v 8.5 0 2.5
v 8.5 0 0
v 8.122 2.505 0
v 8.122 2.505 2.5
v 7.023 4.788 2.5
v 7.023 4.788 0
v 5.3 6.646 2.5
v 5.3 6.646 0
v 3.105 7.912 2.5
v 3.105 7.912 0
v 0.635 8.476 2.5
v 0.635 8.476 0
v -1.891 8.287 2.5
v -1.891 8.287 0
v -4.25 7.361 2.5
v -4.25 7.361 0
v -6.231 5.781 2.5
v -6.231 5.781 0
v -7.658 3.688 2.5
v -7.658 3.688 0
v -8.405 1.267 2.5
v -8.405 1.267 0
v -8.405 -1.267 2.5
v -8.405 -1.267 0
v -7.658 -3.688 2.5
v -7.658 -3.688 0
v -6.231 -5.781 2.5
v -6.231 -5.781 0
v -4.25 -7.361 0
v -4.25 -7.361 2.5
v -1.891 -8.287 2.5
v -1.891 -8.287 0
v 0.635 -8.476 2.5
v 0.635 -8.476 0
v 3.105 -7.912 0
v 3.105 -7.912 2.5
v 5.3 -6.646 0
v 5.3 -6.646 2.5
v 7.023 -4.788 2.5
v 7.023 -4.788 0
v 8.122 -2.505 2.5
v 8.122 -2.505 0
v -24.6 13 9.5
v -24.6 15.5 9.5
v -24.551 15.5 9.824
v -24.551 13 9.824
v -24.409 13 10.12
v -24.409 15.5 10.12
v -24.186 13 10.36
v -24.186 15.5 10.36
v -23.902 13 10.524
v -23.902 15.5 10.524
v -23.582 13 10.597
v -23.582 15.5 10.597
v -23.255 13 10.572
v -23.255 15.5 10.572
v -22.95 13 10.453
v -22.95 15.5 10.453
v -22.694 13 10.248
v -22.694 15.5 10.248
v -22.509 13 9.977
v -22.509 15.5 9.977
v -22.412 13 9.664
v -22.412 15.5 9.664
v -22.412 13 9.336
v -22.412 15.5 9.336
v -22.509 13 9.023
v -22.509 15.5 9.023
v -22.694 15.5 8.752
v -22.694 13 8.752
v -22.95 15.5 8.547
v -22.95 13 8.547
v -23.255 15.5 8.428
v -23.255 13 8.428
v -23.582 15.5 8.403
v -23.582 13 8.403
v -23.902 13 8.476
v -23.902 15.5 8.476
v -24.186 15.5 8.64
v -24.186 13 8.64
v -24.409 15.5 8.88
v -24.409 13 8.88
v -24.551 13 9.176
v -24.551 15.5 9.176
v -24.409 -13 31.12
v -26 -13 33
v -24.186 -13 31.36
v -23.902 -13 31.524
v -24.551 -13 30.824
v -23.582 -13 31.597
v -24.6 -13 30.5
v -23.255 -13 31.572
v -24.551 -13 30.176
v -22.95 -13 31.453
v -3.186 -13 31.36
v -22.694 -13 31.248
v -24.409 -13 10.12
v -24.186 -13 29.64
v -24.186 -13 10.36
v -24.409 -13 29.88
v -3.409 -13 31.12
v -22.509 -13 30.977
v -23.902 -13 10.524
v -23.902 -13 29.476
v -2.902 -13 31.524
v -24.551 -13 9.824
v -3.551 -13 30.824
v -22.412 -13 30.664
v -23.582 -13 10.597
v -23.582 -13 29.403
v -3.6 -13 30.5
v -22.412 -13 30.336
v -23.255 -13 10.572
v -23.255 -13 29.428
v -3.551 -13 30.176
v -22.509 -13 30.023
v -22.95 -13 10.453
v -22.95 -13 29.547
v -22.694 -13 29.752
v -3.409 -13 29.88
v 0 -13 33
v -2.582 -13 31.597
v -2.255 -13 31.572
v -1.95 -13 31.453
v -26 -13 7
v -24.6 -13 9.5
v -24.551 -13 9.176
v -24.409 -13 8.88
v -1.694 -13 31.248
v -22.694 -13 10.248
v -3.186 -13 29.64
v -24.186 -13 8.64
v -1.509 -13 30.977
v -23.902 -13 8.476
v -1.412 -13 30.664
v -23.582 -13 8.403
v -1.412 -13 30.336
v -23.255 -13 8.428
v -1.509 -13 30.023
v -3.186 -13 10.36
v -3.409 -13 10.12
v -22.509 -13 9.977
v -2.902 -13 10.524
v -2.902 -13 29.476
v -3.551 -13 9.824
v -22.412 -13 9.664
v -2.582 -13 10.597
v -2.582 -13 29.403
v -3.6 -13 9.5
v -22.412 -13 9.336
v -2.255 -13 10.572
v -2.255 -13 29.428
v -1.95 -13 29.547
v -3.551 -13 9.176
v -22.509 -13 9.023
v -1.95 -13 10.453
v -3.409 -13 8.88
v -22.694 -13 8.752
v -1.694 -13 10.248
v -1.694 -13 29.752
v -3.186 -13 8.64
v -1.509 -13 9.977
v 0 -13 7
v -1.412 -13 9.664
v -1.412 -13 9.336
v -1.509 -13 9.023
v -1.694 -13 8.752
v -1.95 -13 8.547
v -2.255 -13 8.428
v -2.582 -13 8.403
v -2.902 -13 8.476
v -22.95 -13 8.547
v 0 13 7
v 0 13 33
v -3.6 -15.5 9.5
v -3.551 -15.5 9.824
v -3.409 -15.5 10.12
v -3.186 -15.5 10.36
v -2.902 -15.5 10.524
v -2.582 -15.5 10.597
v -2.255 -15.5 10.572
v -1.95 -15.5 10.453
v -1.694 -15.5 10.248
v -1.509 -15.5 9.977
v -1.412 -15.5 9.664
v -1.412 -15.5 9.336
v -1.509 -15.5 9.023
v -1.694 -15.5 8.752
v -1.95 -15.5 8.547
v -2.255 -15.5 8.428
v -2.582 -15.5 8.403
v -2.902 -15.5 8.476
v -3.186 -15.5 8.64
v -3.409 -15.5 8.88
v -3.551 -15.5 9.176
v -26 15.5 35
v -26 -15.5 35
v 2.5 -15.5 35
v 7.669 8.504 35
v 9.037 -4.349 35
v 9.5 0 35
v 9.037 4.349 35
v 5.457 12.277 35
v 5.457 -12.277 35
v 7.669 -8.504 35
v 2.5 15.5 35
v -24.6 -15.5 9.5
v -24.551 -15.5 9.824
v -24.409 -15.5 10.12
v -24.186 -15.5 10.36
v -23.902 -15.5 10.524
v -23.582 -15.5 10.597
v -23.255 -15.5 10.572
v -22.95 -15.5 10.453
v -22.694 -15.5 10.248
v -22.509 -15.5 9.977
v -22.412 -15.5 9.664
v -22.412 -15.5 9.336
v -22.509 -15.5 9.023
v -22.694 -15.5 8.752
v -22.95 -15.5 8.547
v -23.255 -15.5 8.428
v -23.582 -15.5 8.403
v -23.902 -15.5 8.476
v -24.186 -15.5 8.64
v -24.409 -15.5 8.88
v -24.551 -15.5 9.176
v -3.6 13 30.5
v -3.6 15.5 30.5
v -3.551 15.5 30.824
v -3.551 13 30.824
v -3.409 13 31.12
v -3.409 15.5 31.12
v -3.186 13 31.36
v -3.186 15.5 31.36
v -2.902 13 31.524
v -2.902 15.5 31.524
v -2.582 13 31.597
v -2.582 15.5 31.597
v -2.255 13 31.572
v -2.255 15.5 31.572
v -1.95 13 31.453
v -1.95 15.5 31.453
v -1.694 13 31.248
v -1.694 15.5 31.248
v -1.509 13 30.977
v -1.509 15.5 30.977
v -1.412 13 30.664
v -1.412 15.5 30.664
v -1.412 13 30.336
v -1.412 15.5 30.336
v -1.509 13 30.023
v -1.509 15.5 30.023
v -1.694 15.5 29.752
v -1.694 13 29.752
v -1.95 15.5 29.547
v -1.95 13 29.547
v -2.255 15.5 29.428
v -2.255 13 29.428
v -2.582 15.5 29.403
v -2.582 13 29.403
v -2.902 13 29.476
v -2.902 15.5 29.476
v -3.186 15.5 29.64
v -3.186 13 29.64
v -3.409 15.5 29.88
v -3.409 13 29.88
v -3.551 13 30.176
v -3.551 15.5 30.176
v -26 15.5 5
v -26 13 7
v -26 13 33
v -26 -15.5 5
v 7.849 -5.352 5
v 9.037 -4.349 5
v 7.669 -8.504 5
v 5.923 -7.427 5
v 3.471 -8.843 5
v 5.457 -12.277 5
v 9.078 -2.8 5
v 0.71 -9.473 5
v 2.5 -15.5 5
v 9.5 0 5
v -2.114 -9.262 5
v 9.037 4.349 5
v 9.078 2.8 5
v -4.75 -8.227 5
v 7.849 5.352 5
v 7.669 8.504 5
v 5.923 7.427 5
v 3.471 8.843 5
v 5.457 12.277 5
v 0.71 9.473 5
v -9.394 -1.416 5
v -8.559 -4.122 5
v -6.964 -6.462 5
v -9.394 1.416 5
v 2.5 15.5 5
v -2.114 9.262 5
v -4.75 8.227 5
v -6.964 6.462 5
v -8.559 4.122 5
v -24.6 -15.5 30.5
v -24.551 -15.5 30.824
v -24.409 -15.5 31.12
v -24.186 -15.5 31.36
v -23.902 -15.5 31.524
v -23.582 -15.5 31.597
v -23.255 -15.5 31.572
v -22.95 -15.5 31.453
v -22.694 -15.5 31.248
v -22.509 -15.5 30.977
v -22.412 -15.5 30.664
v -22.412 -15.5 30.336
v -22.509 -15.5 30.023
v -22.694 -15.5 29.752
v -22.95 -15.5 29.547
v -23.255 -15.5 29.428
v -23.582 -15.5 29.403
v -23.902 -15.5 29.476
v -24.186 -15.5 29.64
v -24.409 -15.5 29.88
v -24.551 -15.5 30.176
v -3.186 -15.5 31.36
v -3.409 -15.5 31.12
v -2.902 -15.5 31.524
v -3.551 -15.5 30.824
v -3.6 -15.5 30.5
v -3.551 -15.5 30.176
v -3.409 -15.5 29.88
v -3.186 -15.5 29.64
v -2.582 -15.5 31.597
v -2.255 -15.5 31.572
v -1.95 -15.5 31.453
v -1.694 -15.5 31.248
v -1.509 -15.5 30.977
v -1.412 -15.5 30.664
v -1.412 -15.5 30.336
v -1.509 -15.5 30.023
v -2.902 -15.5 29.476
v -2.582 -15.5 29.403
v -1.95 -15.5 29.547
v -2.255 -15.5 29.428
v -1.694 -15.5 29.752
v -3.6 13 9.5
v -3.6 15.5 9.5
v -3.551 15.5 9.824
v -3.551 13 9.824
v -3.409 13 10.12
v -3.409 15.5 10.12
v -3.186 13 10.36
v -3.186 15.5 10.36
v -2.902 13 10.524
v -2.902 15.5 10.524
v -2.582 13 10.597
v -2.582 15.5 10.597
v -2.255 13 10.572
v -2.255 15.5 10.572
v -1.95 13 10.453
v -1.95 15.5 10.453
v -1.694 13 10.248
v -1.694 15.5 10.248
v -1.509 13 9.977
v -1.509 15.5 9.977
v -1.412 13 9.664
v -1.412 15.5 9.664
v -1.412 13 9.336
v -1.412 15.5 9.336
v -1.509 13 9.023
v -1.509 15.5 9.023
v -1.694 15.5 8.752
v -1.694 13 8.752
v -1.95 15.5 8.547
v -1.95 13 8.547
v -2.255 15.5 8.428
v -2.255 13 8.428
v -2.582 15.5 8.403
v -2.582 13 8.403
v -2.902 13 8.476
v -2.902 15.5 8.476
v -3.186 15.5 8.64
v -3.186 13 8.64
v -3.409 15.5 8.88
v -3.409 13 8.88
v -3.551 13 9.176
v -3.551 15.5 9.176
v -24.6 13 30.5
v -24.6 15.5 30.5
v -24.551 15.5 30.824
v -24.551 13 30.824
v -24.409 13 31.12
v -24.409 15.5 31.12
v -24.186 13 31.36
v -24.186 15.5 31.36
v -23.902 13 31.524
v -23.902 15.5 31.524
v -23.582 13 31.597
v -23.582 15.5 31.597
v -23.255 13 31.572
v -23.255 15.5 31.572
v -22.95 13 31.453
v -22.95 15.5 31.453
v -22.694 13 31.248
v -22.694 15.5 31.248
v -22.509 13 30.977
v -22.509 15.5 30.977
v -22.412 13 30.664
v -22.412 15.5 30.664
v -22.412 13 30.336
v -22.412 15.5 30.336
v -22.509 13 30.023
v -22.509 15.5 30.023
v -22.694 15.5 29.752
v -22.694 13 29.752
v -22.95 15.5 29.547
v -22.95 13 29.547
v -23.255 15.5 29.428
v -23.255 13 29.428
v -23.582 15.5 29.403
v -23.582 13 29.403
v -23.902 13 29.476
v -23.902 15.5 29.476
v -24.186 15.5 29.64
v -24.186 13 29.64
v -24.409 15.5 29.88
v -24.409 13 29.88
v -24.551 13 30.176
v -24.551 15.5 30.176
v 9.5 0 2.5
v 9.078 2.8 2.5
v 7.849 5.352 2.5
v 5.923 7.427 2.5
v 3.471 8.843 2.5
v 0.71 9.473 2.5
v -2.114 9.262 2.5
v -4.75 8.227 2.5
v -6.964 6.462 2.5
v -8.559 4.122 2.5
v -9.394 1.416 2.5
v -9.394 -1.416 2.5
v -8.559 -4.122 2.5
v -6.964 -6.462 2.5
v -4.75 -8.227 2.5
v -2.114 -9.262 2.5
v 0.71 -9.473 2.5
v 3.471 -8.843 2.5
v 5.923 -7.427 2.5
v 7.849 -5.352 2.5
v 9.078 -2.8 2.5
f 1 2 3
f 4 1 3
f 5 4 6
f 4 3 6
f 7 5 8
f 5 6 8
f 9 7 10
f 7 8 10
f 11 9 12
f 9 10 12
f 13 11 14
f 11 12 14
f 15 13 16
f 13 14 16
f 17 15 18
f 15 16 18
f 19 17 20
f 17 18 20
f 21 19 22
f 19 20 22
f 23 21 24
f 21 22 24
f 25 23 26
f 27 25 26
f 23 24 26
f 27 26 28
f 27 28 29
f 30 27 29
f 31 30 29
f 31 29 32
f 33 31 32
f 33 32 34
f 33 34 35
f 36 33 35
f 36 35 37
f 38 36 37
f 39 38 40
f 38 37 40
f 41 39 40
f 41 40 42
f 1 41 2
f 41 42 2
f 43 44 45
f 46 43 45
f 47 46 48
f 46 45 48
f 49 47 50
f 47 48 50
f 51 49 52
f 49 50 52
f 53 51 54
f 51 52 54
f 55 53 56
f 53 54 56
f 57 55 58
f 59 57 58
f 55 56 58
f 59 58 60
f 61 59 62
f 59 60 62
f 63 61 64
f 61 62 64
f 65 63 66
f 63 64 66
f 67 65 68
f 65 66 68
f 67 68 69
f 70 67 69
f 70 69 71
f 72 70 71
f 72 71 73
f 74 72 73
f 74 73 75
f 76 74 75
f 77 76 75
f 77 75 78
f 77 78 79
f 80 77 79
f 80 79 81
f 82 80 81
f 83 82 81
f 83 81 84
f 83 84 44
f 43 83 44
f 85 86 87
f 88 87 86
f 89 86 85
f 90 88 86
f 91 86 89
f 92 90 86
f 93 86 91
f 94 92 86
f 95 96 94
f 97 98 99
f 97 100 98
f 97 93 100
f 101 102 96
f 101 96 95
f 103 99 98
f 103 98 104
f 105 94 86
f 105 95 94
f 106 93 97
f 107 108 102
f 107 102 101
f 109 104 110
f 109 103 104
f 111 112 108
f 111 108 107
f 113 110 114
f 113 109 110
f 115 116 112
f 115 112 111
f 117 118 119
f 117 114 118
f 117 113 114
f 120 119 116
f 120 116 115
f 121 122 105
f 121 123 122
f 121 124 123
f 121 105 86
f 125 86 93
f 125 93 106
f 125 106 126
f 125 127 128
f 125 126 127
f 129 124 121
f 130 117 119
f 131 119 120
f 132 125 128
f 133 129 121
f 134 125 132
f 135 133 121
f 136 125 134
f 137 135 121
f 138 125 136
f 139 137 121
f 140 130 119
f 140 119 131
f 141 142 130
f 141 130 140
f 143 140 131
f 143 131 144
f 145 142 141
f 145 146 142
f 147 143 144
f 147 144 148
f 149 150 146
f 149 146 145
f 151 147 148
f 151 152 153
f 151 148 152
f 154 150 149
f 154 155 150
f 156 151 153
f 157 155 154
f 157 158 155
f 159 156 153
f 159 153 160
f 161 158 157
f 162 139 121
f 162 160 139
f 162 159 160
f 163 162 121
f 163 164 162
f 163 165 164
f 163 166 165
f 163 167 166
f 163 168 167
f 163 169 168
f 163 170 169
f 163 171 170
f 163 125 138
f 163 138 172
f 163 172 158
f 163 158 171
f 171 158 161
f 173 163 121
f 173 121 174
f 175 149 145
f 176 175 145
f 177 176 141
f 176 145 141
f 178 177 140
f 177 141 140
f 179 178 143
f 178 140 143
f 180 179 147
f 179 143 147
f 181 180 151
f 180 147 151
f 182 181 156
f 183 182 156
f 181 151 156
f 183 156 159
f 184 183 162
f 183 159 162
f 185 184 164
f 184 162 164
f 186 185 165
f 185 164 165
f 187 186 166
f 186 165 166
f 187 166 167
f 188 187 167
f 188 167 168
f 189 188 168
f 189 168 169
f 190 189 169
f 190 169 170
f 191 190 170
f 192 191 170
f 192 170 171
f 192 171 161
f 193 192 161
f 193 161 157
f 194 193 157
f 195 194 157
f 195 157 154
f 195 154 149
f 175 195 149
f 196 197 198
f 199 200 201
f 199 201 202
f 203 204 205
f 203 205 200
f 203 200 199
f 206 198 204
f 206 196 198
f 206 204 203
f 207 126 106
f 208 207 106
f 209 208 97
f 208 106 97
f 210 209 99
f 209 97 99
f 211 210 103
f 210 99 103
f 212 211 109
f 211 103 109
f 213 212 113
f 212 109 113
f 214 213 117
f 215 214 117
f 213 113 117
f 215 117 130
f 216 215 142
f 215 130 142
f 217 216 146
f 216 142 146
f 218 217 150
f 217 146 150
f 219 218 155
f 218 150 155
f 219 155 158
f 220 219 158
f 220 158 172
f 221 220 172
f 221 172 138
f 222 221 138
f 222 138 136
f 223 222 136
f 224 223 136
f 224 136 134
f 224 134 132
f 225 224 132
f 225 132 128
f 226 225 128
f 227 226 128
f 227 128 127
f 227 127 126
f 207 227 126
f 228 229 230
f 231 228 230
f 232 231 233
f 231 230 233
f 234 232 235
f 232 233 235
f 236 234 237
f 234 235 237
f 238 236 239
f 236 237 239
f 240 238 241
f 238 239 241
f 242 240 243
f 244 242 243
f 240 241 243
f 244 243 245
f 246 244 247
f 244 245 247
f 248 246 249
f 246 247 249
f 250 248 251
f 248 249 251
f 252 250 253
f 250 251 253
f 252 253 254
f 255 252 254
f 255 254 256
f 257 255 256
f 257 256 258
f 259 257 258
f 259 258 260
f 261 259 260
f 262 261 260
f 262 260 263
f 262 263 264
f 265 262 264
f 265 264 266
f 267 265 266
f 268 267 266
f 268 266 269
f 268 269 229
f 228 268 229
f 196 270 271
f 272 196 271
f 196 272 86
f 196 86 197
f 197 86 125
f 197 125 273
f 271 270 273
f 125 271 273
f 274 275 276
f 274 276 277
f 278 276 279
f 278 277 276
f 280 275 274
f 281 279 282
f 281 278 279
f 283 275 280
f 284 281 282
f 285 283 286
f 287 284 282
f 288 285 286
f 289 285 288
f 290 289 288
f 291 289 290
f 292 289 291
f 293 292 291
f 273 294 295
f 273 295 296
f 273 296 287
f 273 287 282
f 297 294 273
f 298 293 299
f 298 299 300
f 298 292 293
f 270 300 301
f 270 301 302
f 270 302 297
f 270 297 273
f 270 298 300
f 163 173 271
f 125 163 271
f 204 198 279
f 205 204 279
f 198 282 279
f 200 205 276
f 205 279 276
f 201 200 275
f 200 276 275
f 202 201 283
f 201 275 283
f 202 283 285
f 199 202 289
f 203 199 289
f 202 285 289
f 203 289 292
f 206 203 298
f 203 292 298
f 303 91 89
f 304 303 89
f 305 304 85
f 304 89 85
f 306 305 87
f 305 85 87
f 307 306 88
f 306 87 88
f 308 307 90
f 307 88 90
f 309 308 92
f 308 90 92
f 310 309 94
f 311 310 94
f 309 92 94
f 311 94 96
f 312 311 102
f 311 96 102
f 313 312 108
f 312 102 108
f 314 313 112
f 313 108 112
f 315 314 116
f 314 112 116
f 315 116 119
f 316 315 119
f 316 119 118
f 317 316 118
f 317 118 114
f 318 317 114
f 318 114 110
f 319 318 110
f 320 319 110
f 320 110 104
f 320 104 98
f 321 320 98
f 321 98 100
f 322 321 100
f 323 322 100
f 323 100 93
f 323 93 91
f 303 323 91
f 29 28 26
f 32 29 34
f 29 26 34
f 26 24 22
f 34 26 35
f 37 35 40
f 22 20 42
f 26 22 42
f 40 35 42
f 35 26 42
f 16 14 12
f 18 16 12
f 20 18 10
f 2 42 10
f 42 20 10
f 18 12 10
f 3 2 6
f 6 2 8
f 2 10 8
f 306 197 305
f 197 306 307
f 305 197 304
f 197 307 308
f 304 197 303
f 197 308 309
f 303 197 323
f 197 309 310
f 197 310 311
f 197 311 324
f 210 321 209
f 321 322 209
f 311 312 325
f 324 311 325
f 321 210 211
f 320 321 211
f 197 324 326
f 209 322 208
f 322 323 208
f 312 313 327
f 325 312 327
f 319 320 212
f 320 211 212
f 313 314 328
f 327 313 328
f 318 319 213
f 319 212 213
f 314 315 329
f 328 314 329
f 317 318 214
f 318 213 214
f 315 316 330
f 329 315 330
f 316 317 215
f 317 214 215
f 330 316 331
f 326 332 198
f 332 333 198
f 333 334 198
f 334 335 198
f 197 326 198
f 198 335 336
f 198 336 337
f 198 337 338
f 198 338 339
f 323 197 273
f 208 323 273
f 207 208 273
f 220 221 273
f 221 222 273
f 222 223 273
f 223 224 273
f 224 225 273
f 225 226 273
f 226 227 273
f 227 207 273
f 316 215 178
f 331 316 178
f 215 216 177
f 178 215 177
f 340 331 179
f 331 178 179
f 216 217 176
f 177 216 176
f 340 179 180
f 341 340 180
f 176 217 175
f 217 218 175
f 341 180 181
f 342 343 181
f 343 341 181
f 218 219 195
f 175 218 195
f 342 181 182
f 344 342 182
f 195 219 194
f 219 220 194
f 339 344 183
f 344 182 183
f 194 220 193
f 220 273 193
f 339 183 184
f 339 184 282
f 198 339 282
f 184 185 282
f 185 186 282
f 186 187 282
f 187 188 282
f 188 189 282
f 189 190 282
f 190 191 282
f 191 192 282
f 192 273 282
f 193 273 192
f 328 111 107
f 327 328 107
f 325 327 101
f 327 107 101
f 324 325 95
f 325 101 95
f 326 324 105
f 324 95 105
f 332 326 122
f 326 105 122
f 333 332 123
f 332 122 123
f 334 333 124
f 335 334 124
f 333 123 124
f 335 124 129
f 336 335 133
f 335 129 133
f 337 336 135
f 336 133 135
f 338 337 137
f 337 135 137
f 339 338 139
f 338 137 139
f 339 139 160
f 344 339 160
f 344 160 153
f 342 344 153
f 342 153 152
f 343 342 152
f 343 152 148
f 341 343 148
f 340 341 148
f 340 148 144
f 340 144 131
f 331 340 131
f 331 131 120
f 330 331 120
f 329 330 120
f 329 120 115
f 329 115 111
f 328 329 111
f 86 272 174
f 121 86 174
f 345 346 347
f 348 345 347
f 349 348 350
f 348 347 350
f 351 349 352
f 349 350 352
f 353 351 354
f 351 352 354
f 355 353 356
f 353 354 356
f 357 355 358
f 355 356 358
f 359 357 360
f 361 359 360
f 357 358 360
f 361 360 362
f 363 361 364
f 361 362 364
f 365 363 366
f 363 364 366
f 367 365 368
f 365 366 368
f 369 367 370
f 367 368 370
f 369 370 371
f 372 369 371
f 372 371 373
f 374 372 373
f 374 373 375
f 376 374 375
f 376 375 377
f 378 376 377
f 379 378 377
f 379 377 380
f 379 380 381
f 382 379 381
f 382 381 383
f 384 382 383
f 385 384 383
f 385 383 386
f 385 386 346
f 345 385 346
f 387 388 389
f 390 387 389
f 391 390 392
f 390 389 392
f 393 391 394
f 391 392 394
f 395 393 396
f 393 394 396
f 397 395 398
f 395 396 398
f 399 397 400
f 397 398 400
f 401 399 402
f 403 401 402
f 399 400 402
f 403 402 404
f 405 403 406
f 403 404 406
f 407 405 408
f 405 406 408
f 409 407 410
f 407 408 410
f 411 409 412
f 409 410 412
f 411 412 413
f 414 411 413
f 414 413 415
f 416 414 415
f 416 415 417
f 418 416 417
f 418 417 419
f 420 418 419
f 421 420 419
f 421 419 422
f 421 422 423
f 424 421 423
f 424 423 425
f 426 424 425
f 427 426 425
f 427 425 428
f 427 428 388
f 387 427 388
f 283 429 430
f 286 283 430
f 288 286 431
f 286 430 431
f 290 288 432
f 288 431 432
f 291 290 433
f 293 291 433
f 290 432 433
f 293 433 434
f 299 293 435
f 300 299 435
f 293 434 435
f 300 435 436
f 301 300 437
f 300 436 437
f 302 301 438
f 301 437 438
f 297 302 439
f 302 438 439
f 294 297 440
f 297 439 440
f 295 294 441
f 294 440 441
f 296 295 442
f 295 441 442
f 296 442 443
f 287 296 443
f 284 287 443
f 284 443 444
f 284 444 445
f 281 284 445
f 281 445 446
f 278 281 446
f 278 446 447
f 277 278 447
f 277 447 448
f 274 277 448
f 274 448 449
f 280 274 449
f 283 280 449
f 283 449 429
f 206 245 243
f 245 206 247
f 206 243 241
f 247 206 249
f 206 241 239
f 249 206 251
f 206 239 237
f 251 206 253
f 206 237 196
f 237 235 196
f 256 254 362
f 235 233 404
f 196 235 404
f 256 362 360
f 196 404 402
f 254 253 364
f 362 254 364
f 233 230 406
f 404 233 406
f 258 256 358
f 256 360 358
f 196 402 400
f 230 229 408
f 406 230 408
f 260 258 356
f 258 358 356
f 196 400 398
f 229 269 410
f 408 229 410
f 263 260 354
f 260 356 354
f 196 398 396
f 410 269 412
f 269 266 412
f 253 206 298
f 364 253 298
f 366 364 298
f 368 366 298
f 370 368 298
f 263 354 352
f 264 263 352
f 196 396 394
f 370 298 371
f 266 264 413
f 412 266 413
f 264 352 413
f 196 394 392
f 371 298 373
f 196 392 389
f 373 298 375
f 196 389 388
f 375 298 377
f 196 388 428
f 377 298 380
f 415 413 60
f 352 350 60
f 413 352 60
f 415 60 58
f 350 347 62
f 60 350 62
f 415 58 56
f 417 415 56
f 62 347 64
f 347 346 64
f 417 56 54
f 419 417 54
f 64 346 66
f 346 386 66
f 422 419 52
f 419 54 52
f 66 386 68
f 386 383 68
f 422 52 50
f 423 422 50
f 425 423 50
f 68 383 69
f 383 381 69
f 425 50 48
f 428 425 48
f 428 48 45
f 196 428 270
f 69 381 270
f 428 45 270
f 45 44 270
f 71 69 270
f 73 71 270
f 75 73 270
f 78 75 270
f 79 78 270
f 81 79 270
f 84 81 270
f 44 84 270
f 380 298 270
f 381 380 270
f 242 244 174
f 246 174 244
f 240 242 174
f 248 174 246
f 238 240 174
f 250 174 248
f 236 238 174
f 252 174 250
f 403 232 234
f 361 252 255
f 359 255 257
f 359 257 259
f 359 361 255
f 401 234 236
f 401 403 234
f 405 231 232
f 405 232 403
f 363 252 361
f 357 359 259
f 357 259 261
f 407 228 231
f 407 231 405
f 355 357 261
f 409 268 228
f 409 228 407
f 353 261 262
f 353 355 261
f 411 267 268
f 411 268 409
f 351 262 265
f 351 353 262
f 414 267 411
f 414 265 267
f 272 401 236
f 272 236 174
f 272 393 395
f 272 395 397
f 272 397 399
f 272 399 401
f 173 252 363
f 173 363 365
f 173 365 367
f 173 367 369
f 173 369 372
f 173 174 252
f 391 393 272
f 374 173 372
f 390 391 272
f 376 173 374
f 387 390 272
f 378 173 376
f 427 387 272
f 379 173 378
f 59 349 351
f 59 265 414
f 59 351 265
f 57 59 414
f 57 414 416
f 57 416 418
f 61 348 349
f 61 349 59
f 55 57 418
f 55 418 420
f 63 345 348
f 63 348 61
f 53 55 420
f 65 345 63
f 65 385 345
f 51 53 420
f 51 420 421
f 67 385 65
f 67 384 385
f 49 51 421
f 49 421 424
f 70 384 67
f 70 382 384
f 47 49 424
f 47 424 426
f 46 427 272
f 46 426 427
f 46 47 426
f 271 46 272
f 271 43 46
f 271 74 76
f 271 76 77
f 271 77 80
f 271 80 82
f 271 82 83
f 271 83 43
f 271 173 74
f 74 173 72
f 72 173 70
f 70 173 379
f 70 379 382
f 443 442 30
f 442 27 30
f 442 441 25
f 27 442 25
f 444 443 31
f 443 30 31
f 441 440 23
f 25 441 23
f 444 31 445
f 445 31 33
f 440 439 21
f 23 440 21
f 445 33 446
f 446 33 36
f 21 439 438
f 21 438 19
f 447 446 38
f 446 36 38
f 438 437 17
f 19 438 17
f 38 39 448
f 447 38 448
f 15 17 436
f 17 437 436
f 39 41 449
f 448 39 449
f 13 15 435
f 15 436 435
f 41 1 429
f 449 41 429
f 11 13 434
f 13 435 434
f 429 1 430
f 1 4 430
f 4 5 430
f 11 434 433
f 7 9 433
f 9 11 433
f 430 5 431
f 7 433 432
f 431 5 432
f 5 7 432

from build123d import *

# Parameters (mm, degrees)
SKETCH_1_R          = 8.5
EXTRUDE_1_DEPTH     = 2.5
SKETCH_2_R          = 9.5
EXTRUDE_2_DEPTH     = 2.5
EXTRUDE_3_DEPTH     = 28
SKETCH_4_W          = 26
SKETCH_4_H          = 26
EXTRUDE_5_DEPTH     = 2
EXTRUDE_6_DEPTH     = 2
SKETCH_7_R          = 1.1
CUT_EXTRUDE_1_DEPTH = 54.4976635


with BuildPart() as part:
    # ｽｹｯﾁ1 → ﾎﾞｽ - 押し出し1 (new body)
    with BuildSketch(Plane.XY):
        Circle(SKETCH_1_R)
    extrude(amount=EXTRUDE_1_DEPTH)

    # ｽｹｯﾁ2 → ﾎﾞｽ - 押し出し2 (add)
    with BuildSketch(Plane.XY.offset(2.5)):
        Circle(SKETCH_2_R)
    extrude(amount=EXTRUDE_2_DEPTH)

    # ｽｹｯﾁ3 → ﾎﾞｽ - 押し出し3 (add)
    with BuildSketch(Plane.XY.offset(5)):
        with BuildLine():
            Line((-26, 15.5), (2.5, 15.5))
            ThreePointArc((2.5, 15.5), (9.5, 0), (2.5, -15.5))
            Line((2.5, -15.5), (-26, -15.5))
            Line((-26, -15.5), (-26, -13))
            Line((-26, -13), (0, -13))
            Line((0, -13), (0, 13))
            Line((0, 13), (-26, 13))
            Line((-26, 13), (-26, 15.5))
        make_face()
    extrude(amount=EXTRUDE_3_DEPTH)

    # ｽｹｯﾁ4 → ﾎﾞｽ - 押し出し5 (add)
    with BuildSketch(Plane(origin=(0, 0, 5), x_dir=(-1, 0, 0), z_dir=(0, 0, -1))):
        with Locations((13, 0)):
            Rectangle(SKETCH_4_W, SKETCH_4_H)
    extrude(amount=-EXTRUDE_5_DEPTH)

    # ｽｹｯﾁ6 → ﾎﾞｽ - 押し出し6 (add)
    with BuildSketch(Plane.XY.offset(33)):
        with BuildLine():
            Line((-26, 15.5), (-26, -15.5))
            Line((-26, -15.5), (2.5, -15.5))
            ThreePointArc((2.5, -15.5), (9.5, 0), (2.5, 15.5))
            Line((2.5, 15.5), (-26, 15.5))
        make_face()
    extrude(amount=EXTRUDE_6_DEPTH)

    # ｽｹｯﾁ7 → ｶｯﾄ - 押し出し1 (cut, through all)
    with BuildSketch(Plane(origin=(0, 15.5, 0), x_dir=(1, 0, 0), z_dir=(0, 1, 0))):
        with Locations(Location((-23.5, -9.5, 0), (0, 0, 180))):
            Circle(SKETCH_7_R)
        with Locations(Location((-2.5, -9.5, 0), (0, 0, 180))):
            Circle(SKETCH_7_R)
        with Locations(Location((-2.5, -30.5, 0), (0, 0, 180))):
            Circle(SKETCH_7_R)
        with Locations(Location((-23.5, -30.5, 0), (0, 0, 180))):
            Circle(SKETCH_7_R)
    extrude(amount=-CUT_EXTRUDE_1_DEPTH, mode=Mode.SUBTRACT)


solid = part.part
